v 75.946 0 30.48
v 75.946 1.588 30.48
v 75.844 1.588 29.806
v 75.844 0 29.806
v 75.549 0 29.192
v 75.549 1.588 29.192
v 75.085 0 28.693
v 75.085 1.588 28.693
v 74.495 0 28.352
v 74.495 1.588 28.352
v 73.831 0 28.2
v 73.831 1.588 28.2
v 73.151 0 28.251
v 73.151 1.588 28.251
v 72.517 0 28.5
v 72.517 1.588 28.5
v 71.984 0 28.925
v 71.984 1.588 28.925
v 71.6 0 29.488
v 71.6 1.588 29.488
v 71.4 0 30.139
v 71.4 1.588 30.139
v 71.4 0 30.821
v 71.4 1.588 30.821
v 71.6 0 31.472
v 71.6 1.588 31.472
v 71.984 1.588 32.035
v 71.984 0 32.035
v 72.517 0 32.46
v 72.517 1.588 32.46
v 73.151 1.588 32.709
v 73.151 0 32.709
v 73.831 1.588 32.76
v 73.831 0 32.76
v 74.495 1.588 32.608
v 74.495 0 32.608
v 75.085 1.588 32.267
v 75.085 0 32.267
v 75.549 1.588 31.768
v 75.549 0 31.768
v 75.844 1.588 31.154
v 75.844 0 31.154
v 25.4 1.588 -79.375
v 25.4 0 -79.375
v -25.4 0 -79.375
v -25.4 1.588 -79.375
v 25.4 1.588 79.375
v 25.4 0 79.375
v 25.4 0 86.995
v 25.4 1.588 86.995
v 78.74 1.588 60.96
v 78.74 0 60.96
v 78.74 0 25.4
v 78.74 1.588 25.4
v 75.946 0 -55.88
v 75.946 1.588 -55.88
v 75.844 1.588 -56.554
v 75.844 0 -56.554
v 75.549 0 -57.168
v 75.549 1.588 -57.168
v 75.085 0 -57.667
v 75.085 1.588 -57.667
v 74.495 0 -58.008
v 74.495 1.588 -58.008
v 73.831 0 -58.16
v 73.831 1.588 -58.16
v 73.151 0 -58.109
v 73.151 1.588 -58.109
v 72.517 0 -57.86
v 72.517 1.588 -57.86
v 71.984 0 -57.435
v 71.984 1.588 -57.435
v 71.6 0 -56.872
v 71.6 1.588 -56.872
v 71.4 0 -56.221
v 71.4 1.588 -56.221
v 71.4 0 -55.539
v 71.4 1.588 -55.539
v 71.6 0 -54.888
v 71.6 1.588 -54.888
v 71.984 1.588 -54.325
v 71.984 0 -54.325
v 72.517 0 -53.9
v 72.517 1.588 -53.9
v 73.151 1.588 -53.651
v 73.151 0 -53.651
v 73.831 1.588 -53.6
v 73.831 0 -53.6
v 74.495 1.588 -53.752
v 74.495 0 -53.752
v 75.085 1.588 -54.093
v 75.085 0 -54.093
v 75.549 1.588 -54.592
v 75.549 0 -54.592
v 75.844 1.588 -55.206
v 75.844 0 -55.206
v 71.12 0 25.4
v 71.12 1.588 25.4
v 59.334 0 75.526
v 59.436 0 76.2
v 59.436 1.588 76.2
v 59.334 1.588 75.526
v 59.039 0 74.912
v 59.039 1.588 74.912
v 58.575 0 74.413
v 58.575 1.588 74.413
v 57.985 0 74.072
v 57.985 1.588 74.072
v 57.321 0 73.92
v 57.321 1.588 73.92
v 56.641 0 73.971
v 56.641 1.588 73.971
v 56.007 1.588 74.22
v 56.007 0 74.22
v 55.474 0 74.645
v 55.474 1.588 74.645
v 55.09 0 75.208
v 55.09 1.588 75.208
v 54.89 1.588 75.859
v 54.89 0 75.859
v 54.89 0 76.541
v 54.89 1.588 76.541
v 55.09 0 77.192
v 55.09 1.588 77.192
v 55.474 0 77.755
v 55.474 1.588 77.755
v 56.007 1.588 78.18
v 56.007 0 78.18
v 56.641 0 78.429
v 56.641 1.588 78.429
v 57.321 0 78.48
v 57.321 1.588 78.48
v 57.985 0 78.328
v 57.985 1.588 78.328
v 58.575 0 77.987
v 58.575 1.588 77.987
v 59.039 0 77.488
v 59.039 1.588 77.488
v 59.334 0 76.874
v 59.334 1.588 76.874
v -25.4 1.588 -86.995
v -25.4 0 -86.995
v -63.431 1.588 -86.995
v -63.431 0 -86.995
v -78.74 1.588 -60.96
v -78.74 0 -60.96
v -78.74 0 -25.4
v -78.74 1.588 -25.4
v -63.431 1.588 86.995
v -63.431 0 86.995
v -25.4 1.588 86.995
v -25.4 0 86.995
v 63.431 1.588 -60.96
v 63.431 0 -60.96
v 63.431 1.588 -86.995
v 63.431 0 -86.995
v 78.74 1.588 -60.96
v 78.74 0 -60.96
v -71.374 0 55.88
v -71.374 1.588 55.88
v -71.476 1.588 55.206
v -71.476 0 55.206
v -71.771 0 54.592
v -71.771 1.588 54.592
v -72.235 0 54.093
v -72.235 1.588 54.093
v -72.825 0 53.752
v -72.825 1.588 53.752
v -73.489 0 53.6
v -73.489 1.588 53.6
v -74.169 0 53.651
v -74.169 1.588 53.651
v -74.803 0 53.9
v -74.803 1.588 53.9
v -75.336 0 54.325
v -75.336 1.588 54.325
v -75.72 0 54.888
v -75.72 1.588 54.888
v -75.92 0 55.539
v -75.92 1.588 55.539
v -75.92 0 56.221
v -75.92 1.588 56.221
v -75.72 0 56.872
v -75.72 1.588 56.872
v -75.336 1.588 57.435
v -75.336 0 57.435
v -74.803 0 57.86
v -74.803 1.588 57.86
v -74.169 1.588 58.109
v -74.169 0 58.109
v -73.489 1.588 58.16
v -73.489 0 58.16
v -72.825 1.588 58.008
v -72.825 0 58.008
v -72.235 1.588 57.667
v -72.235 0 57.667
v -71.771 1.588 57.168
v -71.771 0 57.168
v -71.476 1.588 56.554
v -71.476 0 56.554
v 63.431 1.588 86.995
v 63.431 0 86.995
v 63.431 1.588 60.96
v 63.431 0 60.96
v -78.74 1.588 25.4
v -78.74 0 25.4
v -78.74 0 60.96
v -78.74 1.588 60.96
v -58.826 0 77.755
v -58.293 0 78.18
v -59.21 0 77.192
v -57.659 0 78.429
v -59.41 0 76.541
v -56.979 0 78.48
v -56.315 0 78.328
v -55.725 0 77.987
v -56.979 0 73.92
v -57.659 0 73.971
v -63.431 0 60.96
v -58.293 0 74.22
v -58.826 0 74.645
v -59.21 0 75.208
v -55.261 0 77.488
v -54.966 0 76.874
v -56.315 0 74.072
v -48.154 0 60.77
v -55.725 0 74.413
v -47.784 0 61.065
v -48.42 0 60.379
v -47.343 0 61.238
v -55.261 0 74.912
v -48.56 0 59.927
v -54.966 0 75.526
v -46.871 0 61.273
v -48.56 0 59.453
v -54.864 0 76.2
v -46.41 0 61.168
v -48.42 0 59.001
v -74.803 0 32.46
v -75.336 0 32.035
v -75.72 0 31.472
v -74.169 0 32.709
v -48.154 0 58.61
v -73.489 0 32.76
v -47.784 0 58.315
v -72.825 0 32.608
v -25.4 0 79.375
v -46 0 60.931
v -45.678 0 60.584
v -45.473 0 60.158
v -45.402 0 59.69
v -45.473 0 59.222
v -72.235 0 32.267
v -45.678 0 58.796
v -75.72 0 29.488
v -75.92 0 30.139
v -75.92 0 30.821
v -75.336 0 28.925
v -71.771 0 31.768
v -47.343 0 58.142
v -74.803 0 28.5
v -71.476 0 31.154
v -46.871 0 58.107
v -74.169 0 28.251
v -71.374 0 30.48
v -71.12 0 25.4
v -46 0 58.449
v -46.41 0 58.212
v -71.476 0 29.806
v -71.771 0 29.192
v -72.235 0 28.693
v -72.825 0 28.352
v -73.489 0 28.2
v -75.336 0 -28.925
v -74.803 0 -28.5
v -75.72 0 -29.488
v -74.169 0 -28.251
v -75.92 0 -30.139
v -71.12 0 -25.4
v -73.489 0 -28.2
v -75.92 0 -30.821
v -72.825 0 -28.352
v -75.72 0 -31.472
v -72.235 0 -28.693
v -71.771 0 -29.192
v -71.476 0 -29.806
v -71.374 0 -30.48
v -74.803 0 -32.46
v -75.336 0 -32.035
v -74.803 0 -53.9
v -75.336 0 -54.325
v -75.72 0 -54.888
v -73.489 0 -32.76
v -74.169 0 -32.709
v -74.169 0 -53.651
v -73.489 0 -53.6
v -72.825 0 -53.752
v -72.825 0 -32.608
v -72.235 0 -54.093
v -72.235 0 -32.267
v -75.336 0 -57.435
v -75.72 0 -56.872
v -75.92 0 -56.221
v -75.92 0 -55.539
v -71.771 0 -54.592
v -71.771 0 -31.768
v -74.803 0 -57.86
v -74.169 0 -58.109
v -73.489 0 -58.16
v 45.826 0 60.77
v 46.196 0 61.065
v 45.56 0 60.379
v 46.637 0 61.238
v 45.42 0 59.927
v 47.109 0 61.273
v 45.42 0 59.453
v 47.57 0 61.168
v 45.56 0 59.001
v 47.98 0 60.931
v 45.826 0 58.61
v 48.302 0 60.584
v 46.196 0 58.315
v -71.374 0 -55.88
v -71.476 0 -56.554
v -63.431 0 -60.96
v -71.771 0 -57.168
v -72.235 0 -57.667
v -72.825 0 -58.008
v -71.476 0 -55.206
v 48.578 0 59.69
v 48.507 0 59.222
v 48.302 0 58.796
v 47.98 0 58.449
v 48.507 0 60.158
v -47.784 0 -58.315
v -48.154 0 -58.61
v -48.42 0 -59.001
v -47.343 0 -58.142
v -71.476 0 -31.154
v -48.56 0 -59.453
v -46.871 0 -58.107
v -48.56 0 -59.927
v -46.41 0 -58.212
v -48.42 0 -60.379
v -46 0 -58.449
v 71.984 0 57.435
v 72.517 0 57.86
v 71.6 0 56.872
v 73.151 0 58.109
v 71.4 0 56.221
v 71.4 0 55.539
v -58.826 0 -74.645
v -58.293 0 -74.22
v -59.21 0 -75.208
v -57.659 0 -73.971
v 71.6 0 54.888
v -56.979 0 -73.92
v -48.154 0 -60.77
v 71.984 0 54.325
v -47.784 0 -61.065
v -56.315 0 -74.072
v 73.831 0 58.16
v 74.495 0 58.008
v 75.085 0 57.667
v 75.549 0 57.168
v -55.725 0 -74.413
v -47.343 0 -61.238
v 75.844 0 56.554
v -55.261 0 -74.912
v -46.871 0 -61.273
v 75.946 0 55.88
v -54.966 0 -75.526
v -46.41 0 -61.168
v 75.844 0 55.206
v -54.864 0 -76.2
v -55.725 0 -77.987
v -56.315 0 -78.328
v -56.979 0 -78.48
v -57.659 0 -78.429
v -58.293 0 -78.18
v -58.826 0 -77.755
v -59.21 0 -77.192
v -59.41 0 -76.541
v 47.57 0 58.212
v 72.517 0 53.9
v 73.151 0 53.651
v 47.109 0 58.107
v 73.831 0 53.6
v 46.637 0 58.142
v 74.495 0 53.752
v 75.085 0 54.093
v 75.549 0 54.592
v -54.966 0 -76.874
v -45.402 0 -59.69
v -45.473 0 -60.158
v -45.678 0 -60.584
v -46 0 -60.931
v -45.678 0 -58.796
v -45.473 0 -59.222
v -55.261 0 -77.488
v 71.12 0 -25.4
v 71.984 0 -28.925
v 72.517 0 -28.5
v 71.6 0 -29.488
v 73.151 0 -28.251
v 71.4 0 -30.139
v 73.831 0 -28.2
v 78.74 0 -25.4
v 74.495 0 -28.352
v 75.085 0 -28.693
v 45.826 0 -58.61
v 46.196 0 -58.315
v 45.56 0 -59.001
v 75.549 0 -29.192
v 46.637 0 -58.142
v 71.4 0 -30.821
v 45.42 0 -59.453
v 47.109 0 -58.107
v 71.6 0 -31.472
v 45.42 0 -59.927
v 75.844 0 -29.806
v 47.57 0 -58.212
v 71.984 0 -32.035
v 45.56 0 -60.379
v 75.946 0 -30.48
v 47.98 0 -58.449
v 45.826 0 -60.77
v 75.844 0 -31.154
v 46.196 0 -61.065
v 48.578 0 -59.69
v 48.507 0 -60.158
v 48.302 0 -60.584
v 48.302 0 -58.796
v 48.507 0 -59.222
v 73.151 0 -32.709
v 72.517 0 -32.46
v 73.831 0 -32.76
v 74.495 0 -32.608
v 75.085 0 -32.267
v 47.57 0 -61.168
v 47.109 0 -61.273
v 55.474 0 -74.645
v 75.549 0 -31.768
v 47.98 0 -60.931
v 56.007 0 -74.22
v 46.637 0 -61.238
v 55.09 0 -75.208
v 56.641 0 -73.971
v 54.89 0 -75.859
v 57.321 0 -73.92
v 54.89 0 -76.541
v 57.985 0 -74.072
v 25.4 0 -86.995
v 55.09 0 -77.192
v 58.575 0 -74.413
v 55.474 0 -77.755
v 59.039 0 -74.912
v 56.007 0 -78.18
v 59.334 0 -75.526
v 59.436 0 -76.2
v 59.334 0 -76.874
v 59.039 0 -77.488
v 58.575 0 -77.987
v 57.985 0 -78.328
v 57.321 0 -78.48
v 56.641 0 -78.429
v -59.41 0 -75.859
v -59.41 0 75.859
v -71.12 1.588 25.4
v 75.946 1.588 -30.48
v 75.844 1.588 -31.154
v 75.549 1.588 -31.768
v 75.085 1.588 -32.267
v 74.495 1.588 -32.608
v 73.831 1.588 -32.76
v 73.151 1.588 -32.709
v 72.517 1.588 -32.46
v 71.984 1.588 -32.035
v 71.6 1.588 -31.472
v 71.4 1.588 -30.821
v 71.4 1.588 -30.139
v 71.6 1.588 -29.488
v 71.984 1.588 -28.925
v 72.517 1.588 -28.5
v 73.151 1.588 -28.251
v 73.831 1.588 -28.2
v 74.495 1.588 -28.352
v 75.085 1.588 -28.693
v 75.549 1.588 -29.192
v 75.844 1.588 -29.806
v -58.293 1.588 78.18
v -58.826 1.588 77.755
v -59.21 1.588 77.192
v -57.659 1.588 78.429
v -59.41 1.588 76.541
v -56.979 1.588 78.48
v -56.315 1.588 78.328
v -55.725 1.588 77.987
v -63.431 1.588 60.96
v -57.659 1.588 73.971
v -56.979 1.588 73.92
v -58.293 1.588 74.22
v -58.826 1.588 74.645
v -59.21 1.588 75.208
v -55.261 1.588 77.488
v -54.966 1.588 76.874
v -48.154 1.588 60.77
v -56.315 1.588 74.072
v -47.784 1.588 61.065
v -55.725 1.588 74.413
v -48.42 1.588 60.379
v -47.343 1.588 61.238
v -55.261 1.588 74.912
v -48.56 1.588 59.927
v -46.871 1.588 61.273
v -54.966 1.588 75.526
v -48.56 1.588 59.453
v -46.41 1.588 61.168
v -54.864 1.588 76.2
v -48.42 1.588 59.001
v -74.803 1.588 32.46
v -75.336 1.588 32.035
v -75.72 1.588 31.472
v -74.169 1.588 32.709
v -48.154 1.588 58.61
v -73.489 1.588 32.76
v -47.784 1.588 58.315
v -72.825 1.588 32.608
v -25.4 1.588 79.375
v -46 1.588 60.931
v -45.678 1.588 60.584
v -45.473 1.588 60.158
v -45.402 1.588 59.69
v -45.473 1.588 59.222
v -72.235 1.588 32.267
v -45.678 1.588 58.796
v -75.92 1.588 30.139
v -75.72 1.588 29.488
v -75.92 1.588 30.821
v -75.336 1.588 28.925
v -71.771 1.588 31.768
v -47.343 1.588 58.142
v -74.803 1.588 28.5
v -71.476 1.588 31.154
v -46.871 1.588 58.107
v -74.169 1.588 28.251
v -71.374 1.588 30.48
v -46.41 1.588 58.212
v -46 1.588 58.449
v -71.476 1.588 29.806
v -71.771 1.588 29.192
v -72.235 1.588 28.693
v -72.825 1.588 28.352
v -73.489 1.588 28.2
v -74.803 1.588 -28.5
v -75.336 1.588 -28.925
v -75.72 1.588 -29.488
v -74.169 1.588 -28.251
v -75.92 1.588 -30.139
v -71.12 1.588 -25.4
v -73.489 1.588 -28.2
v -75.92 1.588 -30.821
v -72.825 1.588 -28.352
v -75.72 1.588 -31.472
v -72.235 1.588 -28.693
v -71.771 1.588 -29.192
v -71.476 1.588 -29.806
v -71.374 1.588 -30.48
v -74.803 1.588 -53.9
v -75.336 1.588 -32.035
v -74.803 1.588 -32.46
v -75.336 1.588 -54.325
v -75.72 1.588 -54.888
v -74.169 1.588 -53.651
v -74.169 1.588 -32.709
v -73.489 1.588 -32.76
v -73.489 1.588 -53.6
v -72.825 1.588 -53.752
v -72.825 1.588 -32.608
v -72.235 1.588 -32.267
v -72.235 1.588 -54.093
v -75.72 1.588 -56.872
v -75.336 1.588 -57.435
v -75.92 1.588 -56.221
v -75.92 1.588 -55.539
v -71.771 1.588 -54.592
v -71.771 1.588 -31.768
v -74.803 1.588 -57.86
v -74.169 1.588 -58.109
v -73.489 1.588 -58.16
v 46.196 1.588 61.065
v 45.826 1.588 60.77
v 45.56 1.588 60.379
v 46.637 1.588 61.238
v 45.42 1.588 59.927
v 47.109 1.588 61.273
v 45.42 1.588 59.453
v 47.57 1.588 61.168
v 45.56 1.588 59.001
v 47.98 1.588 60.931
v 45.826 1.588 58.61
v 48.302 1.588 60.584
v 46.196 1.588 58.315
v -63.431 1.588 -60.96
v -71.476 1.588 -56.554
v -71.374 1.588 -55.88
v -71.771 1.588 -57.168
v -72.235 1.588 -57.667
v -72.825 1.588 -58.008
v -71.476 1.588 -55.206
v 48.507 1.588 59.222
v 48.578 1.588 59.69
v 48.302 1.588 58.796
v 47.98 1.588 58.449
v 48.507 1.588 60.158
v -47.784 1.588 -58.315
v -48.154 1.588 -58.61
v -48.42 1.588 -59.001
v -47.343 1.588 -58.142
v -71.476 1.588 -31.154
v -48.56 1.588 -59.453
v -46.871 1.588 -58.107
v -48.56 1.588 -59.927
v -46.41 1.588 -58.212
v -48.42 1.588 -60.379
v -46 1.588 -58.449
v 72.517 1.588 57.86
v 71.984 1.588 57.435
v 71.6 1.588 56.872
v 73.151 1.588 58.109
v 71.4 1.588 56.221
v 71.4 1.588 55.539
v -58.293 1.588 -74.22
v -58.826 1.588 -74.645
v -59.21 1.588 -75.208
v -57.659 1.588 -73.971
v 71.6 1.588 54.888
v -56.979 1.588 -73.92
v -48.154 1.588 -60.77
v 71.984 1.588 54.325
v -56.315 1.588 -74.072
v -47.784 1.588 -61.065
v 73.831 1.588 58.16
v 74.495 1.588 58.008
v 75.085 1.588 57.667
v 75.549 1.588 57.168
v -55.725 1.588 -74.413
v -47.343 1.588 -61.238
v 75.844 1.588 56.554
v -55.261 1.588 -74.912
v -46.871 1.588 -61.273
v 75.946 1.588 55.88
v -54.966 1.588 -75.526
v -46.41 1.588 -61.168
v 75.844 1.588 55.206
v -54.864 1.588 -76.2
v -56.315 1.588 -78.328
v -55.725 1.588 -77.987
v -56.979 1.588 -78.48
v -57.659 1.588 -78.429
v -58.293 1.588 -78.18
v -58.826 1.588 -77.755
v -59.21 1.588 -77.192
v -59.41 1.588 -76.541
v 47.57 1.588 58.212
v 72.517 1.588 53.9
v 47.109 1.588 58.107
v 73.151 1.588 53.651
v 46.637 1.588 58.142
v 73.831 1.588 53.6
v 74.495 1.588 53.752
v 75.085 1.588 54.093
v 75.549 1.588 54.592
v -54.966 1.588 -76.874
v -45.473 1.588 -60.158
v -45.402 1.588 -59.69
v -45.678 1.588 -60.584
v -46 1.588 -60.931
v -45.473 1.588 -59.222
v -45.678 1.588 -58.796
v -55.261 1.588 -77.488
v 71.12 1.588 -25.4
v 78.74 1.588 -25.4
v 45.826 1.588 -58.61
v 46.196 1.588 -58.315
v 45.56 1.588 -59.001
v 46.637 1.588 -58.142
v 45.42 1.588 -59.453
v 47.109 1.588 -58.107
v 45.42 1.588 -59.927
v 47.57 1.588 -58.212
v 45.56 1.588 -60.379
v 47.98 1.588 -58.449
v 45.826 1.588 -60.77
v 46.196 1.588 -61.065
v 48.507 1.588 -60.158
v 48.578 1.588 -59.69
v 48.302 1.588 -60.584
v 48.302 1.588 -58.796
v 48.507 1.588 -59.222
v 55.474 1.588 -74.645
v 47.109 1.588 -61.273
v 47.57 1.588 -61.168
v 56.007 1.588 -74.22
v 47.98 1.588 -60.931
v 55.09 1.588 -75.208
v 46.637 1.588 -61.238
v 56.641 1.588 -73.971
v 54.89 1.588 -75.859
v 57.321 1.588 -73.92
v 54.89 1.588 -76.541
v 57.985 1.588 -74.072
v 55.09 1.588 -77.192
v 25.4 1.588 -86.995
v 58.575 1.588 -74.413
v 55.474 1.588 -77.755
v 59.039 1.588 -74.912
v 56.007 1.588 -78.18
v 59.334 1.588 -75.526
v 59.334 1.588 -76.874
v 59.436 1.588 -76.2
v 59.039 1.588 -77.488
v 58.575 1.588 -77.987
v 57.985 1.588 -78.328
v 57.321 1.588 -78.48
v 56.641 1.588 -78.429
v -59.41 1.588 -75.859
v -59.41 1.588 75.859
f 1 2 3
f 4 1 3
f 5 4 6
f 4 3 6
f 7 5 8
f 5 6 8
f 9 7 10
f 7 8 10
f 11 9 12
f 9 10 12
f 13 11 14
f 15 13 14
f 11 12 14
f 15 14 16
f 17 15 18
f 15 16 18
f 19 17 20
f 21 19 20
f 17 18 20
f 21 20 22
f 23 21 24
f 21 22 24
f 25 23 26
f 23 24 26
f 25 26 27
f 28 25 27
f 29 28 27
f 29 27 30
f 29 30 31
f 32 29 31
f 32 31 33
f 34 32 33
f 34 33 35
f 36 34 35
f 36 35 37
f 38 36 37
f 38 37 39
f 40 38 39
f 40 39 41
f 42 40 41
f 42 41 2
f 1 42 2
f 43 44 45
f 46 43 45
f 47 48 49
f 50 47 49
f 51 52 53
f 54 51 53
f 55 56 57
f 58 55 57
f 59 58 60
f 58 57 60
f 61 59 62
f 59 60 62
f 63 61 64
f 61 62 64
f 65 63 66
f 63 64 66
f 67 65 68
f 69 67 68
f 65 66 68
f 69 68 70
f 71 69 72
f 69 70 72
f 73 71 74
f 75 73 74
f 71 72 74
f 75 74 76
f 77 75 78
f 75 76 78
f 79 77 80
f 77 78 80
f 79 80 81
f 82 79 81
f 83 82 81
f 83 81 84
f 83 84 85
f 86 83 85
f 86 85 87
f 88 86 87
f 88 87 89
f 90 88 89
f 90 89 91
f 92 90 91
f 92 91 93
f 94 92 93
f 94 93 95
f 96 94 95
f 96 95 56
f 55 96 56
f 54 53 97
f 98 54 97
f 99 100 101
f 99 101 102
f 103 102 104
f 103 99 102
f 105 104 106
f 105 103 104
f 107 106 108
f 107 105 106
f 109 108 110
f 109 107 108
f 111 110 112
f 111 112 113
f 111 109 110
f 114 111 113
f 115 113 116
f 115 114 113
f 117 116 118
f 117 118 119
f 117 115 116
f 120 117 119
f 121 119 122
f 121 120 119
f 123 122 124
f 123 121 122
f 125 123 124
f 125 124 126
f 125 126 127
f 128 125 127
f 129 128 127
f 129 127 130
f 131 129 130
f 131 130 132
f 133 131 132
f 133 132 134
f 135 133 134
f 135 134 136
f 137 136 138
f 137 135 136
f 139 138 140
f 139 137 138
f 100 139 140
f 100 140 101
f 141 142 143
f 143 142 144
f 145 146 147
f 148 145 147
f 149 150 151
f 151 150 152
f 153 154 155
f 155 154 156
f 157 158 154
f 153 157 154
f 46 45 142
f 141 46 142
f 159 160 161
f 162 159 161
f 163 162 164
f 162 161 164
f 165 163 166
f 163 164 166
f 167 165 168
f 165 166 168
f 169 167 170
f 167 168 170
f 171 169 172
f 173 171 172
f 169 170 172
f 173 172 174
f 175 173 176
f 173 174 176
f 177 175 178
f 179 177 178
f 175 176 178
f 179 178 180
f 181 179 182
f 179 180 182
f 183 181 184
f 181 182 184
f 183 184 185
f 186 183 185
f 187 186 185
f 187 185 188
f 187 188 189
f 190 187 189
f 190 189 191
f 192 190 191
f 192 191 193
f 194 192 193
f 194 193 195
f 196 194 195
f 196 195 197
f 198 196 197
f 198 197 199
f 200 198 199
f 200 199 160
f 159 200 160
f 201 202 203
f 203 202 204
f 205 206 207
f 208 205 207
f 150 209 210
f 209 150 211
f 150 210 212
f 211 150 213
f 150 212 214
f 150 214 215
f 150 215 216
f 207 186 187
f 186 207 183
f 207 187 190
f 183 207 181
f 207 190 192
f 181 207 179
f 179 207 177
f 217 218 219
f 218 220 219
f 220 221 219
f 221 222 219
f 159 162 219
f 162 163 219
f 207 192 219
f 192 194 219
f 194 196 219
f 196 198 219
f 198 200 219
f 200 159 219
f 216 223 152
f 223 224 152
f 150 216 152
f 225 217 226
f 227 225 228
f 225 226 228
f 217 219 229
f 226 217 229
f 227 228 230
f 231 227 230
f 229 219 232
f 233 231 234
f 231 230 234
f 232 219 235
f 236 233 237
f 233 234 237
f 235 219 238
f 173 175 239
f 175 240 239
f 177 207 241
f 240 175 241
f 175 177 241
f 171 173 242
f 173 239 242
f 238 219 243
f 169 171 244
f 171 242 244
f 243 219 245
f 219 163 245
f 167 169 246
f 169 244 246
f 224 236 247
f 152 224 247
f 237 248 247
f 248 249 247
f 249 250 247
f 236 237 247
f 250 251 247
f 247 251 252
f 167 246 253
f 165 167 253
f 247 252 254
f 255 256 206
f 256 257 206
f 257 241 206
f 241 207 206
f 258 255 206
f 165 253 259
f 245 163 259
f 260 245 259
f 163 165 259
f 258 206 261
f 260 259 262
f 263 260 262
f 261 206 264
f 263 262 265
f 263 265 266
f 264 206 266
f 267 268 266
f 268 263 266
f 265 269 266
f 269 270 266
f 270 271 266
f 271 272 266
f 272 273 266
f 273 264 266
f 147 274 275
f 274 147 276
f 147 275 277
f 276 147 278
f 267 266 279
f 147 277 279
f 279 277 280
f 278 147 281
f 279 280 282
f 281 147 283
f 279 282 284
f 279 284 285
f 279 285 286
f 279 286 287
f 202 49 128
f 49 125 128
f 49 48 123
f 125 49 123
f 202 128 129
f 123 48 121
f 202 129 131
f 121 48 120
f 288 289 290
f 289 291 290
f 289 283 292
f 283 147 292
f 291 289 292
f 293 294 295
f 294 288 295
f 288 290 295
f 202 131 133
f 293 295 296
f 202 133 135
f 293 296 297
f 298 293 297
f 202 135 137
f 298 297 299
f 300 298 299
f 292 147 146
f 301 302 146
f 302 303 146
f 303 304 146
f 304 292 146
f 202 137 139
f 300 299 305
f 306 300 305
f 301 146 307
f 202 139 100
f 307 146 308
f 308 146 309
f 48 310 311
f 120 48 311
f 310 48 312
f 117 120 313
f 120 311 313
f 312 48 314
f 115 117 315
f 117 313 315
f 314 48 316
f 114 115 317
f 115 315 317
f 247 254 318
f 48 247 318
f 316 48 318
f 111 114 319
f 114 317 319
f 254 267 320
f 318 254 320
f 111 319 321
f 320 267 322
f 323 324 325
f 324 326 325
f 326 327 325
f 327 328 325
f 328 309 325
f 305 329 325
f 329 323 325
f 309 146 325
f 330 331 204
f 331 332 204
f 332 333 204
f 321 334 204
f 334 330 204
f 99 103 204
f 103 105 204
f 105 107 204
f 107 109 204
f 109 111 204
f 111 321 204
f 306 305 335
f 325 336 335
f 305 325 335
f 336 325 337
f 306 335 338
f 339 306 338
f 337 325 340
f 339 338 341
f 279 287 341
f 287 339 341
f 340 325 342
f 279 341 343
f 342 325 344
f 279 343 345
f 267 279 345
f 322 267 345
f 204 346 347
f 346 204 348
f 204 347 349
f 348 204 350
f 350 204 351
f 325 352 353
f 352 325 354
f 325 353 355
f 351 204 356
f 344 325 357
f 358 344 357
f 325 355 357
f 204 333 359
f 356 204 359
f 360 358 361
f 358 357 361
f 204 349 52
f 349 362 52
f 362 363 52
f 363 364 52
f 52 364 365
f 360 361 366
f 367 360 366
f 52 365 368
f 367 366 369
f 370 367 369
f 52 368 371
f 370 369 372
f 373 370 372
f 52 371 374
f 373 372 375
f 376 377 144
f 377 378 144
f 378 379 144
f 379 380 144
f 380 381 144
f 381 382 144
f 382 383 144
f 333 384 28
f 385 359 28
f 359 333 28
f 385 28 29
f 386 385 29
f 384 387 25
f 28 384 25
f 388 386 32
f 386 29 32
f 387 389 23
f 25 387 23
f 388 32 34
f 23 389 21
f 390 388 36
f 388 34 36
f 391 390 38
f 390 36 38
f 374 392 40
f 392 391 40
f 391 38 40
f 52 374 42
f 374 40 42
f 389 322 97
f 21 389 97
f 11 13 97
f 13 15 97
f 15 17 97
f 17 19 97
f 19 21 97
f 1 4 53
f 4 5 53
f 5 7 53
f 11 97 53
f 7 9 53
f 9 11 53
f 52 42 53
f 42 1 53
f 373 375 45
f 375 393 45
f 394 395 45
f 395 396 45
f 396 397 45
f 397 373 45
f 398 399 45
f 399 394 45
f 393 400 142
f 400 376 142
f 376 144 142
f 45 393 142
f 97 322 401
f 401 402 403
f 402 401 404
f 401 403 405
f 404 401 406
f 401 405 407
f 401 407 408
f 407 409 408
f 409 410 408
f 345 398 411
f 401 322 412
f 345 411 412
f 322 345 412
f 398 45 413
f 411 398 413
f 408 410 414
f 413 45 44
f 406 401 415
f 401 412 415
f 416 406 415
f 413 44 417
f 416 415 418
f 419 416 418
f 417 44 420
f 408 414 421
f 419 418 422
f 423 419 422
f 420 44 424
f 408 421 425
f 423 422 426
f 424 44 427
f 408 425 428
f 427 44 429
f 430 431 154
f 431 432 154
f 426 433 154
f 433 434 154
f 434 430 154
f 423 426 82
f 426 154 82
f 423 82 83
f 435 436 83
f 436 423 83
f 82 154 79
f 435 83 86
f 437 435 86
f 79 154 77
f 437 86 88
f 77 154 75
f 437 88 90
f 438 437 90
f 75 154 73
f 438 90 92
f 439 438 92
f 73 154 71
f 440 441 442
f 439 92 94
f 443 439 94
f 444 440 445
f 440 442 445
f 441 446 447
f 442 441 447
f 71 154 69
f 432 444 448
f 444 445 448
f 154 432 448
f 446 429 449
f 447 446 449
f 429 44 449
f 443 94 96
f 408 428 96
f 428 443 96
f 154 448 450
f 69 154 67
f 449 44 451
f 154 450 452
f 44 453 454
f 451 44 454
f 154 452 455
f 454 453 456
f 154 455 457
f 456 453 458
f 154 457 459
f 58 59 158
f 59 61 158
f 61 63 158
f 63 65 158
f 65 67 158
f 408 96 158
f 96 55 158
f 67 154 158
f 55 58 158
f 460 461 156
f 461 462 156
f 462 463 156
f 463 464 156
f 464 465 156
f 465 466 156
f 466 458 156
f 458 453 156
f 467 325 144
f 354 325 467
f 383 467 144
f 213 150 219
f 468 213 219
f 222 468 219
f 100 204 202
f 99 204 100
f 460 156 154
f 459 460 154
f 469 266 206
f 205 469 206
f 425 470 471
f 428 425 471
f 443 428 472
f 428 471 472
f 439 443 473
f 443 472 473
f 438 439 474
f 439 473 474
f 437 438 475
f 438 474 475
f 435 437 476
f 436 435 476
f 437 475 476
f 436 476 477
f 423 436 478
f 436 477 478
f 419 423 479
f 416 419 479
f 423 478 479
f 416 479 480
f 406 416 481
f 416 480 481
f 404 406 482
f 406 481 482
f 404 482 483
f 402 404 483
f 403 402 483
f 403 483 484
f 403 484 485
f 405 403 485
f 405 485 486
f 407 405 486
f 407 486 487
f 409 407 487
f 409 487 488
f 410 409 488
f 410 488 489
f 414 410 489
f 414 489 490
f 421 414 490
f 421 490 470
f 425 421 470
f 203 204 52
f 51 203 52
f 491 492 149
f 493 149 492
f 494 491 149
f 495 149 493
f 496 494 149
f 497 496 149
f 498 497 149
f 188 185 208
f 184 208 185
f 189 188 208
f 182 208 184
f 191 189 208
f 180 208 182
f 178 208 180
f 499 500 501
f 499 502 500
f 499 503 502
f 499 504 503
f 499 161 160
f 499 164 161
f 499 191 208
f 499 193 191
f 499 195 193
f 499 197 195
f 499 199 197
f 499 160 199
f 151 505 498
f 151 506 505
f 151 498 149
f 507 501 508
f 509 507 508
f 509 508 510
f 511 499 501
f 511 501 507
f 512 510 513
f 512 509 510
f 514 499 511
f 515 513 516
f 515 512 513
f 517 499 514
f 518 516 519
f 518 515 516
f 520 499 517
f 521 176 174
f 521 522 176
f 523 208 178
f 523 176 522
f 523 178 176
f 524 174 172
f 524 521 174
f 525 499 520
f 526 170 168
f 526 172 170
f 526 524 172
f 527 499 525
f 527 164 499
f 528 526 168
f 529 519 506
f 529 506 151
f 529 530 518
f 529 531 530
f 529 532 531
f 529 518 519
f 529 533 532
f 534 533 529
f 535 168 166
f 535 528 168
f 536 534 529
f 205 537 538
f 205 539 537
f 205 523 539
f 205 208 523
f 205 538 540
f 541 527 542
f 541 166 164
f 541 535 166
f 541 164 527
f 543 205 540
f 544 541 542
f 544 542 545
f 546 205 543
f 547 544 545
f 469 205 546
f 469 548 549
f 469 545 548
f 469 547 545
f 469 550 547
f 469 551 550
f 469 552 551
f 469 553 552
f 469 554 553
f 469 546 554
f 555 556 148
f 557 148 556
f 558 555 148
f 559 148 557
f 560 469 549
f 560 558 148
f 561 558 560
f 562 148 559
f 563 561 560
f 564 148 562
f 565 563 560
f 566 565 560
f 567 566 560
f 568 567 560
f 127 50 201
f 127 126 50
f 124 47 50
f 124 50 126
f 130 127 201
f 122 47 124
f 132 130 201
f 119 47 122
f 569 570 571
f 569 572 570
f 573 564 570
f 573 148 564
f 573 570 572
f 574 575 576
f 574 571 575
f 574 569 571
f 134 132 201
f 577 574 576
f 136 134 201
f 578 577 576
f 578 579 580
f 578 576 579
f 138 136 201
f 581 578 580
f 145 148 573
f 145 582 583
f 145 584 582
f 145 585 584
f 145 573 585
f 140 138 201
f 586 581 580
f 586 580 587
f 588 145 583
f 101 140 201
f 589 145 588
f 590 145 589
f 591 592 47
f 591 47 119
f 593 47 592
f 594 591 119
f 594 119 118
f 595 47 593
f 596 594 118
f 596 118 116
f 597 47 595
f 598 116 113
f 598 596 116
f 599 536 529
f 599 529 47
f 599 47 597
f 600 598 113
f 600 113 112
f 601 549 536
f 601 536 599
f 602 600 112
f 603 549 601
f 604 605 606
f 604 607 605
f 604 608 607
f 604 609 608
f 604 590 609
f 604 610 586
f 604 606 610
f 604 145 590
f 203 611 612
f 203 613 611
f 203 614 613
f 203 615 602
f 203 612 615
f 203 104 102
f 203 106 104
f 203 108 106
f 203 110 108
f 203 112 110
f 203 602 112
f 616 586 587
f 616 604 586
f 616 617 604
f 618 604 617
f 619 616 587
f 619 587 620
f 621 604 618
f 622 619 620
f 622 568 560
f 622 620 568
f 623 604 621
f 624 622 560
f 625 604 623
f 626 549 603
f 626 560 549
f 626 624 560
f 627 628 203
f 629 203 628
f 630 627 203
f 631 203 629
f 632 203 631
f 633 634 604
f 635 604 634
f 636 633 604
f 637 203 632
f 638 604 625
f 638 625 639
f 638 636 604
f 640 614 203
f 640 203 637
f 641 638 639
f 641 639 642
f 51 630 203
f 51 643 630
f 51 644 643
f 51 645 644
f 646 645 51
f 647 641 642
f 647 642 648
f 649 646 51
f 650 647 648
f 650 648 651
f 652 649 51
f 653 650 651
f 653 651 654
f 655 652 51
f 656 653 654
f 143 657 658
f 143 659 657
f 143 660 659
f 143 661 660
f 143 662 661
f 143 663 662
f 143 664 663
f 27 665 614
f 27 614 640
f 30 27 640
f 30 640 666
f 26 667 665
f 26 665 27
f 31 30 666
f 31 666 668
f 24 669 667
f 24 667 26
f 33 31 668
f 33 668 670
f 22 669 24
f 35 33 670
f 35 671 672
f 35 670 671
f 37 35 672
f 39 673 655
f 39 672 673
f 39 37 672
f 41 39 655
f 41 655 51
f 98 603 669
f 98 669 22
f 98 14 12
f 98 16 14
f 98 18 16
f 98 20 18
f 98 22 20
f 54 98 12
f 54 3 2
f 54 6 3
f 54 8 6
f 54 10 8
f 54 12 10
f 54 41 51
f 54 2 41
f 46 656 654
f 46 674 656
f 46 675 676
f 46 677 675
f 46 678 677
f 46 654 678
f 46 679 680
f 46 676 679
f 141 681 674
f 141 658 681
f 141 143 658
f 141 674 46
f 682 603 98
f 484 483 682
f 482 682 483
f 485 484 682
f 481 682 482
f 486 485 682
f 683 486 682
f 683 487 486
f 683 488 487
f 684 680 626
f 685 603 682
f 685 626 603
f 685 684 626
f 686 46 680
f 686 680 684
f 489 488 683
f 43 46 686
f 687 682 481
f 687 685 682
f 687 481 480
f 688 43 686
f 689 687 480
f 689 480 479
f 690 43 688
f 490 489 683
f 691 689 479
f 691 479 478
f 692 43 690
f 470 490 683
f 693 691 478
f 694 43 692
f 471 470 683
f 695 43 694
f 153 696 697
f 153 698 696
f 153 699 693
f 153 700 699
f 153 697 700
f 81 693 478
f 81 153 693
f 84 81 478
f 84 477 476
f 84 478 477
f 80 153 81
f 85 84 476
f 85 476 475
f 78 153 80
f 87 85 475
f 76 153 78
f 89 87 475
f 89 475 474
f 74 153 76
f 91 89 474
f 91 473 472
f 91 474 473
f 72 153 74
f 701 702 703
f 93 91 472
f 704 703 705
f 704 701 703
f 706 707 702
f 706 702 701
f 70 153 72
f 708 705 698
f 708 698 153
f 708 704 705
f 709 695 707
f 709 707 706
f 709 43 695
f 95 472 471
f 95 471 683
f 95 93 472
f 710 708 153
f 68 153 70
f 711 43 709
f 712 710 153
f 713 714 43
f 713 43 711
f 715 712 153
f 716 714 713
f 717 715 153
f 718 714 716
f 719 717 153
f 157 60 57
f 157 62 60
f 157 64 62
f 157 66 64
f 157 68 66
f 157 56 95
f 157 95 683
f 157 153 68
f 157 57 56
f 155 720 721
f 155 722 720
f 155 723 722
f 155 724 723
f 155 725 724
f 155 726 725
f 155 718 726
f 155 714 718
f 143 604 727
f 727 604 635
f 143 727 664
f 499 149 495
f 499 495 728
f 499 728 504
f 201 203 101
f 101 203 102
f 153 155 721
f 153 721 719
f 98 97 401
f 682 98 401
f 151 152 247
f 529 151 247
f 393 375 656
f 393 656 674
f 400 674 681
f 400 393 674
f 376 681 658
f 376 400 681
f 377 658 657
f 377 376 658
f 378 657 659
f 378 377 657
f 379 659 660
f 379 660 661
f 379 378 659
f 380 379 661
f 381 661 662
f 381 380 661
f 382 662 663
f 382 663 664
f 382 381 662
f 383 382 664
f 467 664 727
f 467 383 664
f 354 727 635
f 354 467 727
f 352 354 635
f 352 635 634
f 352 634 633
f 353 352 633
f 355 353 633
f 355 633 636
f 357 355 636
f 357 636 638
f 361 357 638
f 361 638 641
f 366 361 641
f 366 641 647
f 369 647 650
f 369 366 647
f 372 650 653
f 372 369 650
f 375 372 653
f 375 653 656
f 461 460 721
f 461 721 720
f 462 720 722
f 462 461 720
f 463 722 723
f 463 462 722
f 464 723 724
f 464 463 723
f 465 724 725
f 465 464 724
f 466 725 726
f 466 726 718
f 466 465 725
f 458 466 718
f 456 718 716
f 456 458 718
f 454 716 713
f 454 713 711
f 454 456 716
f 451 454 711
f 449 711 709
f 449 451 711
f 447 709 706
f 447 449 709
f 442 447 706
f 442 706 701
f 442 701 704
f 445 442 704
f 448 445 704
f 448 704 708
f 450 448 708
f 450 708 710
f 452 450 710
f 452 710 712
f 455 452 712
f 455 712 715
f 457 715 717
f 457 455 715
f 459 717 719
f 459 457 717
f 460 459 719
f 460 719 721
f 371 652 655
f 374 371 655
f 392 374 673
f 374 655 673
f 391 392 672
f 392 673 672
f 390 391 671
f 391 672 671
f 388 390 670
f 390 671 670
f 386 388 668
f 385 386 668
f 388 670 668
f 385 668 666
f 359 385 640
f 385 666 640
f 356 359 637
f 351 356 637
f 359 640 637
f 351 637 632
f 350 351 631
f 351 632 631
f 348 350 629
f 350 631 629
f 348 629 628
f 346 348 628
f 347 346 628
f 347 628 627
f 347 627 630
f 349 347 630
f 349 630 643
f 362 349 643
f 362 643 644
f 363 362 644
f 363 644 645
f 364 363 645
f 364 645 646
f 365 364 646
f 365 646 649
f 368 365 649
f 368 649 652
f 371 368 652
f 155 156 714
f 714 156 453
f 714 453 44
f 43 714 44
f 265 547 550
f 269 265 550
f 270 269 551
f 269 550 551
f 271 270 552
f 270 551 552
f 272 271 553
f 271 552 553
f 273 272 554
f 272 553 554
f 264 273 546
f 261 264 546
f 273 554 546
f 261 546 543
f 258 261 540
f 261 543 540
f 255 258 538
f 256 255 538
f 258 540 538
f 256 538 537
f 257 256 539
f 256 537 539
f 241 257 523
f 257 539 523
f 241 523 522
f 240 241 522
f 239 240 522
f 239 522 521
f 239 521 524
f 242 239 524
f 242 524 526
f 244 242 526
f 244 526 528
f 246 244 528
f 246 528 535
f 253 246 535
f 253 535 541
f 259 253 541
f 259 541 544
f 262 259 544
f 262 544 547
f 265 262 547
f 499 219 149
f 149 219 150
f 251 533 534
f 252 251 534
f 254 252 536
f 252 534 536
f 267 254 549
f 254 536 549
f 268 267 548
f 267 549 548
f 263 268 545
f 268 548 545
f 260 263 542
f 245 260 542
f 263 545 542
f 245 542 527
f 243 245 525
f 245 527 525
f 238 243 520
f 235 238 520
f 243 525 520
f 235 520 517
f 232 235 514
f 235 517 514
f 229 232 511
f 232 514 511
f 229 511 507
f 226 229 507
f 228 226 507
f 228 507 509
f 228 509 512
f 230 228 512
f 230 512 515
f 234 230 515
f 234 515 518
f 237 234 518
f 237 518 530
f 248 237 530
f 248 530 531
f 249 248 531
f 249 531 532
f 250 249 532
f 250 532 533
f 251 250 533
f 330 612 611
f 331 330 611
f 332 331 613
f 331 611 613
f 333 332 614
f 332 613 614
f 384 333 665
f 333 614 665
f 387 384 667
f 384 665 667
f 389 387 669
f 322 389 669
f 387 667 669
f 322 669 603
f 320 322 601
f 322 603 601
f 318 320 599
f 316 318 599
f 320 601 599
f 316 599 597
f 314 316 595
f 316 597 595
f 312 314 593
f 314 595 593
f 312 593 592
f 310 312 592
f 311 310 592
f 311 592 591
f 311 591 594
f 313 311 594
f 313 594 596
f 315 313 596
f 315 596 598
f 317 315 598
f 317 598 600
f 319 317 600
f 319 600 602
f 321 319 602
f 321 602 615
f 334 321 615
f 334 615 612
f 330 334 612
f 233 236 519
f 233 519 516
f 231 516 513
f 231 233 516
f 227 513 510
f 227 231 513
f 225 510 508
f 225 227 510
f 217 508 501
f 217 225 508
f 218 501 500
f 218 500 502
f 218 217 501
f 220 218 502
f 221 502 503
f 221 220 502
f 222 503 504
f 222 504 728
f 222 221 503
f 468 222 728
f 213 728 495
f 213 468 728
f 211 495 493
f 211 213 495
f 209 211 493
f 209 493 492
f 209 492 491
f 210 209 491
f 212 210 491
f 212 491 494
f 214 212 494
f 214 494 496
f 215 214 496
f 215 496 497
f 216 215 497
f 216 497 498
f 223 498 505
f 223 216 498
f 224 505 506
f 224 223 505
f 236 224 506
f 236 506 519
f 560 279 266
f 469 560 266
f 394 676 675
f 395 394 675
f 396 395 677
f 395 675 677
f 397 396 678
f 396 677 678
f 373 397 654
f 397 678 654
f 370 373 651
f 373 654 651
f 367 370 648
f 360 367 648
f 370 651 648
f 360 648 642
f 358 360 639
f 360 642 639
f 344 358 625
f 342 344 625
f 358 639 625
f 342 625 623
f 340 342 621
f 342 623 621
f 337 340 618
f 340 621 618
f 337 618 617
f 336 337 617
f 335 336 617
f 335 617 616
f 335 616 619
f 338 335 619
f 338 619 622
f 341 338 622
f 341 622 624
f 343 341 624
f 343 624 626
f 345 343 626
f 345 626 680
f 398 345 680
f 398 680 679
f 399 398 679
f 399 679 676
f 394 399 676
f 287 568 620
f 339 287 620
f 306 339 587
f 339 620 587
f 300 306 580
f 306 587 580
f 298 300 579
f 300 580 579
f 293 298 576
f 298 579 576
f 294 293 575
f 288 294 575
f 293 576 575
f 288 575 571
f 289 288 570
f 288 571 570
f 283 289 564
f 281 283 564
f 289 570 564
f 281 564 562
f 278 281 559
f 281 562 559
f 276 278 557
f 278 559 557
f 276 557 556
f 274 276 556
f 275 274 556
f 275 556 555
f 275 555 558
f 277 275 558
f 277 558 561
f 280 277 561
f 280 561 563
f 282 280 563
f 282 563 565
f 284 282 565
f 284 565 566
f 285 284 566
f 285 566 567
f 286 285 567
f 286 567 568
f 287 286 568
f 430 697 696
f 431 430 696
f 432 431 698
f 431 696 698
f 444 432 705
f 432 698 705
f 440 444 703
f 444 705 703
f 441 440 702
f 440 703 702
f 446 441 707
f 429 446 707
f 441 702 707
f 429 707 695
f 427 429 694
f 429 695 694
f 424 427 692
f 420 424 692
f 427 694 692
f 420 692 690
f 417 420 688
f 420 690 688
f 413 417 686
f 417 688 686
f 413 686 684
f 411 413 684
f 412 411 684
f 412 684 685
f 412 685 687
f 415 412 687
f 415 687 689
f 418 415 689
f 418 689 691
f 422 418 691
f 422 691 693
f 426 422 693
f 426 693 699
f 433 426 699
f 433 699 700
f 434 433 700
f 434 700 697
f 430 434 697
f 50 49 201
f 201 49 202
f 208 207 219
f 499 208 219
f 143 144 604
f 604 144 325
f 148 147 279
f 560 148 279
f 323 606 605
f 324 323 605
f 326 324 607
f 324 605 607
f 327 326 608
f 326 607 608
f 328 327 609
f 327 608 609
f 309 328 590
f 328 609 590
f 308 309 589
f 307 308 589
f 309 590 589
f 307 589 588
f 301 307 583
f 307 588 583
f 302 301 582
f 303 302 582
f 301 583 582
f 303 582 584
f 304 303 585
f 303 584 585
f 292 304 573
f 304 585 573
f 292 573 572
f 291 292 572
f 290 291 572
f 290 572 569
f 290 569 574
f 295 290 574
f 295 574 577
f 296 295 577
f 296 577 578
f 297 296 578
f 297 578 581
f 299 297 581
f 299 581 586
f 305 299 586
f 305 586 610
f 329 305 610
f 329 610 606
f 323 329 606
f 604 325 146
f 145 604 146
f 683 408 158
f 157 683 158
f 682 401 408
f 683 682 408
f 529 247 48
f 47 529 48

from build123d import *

# Parameters (mm, degrees)
SKETCH1_R           = 2.286
MAIN_BODY_DEPTH     = 1.5875
SKETCH2_R           = 2.286
MOUNT_HOLES_DEPTH   = 2.5875
SKETCH3_R           = 1.5875
OLD_PCB_HOLES_DEPTH = 2.54


with BuildPart() as part:
    # Sketch1 → Main Body (new body)
    with BuildSketch(Plane(origin=(0, 0, 0), x_dir=(1, 0, 0), z_dir=(0, 1, 0))):
        Polygon((-25.4, 86.995), (-63.43142, 86.995), (-63.43142, 60.96), (-78.74, 60.96), (-78.74, 25.4), (-71.12, 25.4), (-71.12, -25.4), (-78.74, -25.4), (-78.74, -60.96), (-63.43142, -60.96), (-63.43142, -86.995), (-25.4, -86.995), (-25.4, -79.375), (25.4, -79.375), (25.4, -86.995), (63.43142, -86.995), (63.43142, -60.96), (78.74, -60.96), (78.74, -25.4), (71.12, -25.4), (71.12, 25.4), (78.74, 25.4), (78.74, 60.96), (63.43142, 60.96), (63.43142, 86.995), (25.4, 86.995), (25.4, 79.375), (-25.4, 79.375), align=None)
        with Locations((-57.15, 76.2)):
            Circle(SKETCH1_R, mode=Mode.SUBTRACT)
        with Locations((57.15, 76.2)):
            Circle(SKETCH1_R, mode=Mode.SUBTRACT)
        with Locations((57.15, -76.2)):
            Circle(SKETCH1_R, mode=Mode.SUBTRACT)
        with Locations((-57.15, -76.2)):
            Circle(SKETCH1_R, mode=Mode.SUBTRACT)
    extrude(amount=MAIN_BODY_DEPTH)

    # Sketch2 → Mount Holes (cut, through all)
    with BuildSketch(Plane(origin=(0, 1.5875, 0), x_dir=(1, 0, 0), z_dir=(0, 1, 0))):
        with Locations((-73.66, -30.48)):
            Circle(SKETCH2_R)
        with Locations((-73.66, -55.88)):
            Circle(SKETCH2_R)
        with Locations((73.66, -55.88)):
            Circle(SKETCH2_R)
        with Locations((73.66, -30.48)):
            Circle(SKETCH2_R)
        with Locations((73.66, 30.48)):
            Circle(SKETCH2_R)
        with Locations((73.66, 55.88)):
            Circle(SKETCH2_R)
        with Locations((-73.66, 55.88)):
            Circle(SKETCH2_R)
        with Locations((-73.66, 30.48)):
            Circle(SKETCH2_R)
    extrude(amount=-MOUNT_HOLES_DEPTH, mode=Mode.SUBTRACT)

    # Sketch3 → Old PCB Holes (cut)
    with BuildSketch(Plane(origin=(0, 1.5875, 0), x_dir=(1, 0, 0), z_dir=(0, 1, 0))):
        with Locations((46.99, -59.69)):
            Circle(SKETCH3_R)
        with Locations((-46.99, -59.69)):
            Circle(SKETCH3_R)
        with Locations((-46.99, 59.69)):
            Circle(SKETCH3_R)
        with Locations((46.99, 59.69)):
            Circle(SKETCH3_R)
    extrude(amount=-OLD_PCB_HOLES_DEPTH, mode=Mode.SUBTRACT)


solid = part.part
